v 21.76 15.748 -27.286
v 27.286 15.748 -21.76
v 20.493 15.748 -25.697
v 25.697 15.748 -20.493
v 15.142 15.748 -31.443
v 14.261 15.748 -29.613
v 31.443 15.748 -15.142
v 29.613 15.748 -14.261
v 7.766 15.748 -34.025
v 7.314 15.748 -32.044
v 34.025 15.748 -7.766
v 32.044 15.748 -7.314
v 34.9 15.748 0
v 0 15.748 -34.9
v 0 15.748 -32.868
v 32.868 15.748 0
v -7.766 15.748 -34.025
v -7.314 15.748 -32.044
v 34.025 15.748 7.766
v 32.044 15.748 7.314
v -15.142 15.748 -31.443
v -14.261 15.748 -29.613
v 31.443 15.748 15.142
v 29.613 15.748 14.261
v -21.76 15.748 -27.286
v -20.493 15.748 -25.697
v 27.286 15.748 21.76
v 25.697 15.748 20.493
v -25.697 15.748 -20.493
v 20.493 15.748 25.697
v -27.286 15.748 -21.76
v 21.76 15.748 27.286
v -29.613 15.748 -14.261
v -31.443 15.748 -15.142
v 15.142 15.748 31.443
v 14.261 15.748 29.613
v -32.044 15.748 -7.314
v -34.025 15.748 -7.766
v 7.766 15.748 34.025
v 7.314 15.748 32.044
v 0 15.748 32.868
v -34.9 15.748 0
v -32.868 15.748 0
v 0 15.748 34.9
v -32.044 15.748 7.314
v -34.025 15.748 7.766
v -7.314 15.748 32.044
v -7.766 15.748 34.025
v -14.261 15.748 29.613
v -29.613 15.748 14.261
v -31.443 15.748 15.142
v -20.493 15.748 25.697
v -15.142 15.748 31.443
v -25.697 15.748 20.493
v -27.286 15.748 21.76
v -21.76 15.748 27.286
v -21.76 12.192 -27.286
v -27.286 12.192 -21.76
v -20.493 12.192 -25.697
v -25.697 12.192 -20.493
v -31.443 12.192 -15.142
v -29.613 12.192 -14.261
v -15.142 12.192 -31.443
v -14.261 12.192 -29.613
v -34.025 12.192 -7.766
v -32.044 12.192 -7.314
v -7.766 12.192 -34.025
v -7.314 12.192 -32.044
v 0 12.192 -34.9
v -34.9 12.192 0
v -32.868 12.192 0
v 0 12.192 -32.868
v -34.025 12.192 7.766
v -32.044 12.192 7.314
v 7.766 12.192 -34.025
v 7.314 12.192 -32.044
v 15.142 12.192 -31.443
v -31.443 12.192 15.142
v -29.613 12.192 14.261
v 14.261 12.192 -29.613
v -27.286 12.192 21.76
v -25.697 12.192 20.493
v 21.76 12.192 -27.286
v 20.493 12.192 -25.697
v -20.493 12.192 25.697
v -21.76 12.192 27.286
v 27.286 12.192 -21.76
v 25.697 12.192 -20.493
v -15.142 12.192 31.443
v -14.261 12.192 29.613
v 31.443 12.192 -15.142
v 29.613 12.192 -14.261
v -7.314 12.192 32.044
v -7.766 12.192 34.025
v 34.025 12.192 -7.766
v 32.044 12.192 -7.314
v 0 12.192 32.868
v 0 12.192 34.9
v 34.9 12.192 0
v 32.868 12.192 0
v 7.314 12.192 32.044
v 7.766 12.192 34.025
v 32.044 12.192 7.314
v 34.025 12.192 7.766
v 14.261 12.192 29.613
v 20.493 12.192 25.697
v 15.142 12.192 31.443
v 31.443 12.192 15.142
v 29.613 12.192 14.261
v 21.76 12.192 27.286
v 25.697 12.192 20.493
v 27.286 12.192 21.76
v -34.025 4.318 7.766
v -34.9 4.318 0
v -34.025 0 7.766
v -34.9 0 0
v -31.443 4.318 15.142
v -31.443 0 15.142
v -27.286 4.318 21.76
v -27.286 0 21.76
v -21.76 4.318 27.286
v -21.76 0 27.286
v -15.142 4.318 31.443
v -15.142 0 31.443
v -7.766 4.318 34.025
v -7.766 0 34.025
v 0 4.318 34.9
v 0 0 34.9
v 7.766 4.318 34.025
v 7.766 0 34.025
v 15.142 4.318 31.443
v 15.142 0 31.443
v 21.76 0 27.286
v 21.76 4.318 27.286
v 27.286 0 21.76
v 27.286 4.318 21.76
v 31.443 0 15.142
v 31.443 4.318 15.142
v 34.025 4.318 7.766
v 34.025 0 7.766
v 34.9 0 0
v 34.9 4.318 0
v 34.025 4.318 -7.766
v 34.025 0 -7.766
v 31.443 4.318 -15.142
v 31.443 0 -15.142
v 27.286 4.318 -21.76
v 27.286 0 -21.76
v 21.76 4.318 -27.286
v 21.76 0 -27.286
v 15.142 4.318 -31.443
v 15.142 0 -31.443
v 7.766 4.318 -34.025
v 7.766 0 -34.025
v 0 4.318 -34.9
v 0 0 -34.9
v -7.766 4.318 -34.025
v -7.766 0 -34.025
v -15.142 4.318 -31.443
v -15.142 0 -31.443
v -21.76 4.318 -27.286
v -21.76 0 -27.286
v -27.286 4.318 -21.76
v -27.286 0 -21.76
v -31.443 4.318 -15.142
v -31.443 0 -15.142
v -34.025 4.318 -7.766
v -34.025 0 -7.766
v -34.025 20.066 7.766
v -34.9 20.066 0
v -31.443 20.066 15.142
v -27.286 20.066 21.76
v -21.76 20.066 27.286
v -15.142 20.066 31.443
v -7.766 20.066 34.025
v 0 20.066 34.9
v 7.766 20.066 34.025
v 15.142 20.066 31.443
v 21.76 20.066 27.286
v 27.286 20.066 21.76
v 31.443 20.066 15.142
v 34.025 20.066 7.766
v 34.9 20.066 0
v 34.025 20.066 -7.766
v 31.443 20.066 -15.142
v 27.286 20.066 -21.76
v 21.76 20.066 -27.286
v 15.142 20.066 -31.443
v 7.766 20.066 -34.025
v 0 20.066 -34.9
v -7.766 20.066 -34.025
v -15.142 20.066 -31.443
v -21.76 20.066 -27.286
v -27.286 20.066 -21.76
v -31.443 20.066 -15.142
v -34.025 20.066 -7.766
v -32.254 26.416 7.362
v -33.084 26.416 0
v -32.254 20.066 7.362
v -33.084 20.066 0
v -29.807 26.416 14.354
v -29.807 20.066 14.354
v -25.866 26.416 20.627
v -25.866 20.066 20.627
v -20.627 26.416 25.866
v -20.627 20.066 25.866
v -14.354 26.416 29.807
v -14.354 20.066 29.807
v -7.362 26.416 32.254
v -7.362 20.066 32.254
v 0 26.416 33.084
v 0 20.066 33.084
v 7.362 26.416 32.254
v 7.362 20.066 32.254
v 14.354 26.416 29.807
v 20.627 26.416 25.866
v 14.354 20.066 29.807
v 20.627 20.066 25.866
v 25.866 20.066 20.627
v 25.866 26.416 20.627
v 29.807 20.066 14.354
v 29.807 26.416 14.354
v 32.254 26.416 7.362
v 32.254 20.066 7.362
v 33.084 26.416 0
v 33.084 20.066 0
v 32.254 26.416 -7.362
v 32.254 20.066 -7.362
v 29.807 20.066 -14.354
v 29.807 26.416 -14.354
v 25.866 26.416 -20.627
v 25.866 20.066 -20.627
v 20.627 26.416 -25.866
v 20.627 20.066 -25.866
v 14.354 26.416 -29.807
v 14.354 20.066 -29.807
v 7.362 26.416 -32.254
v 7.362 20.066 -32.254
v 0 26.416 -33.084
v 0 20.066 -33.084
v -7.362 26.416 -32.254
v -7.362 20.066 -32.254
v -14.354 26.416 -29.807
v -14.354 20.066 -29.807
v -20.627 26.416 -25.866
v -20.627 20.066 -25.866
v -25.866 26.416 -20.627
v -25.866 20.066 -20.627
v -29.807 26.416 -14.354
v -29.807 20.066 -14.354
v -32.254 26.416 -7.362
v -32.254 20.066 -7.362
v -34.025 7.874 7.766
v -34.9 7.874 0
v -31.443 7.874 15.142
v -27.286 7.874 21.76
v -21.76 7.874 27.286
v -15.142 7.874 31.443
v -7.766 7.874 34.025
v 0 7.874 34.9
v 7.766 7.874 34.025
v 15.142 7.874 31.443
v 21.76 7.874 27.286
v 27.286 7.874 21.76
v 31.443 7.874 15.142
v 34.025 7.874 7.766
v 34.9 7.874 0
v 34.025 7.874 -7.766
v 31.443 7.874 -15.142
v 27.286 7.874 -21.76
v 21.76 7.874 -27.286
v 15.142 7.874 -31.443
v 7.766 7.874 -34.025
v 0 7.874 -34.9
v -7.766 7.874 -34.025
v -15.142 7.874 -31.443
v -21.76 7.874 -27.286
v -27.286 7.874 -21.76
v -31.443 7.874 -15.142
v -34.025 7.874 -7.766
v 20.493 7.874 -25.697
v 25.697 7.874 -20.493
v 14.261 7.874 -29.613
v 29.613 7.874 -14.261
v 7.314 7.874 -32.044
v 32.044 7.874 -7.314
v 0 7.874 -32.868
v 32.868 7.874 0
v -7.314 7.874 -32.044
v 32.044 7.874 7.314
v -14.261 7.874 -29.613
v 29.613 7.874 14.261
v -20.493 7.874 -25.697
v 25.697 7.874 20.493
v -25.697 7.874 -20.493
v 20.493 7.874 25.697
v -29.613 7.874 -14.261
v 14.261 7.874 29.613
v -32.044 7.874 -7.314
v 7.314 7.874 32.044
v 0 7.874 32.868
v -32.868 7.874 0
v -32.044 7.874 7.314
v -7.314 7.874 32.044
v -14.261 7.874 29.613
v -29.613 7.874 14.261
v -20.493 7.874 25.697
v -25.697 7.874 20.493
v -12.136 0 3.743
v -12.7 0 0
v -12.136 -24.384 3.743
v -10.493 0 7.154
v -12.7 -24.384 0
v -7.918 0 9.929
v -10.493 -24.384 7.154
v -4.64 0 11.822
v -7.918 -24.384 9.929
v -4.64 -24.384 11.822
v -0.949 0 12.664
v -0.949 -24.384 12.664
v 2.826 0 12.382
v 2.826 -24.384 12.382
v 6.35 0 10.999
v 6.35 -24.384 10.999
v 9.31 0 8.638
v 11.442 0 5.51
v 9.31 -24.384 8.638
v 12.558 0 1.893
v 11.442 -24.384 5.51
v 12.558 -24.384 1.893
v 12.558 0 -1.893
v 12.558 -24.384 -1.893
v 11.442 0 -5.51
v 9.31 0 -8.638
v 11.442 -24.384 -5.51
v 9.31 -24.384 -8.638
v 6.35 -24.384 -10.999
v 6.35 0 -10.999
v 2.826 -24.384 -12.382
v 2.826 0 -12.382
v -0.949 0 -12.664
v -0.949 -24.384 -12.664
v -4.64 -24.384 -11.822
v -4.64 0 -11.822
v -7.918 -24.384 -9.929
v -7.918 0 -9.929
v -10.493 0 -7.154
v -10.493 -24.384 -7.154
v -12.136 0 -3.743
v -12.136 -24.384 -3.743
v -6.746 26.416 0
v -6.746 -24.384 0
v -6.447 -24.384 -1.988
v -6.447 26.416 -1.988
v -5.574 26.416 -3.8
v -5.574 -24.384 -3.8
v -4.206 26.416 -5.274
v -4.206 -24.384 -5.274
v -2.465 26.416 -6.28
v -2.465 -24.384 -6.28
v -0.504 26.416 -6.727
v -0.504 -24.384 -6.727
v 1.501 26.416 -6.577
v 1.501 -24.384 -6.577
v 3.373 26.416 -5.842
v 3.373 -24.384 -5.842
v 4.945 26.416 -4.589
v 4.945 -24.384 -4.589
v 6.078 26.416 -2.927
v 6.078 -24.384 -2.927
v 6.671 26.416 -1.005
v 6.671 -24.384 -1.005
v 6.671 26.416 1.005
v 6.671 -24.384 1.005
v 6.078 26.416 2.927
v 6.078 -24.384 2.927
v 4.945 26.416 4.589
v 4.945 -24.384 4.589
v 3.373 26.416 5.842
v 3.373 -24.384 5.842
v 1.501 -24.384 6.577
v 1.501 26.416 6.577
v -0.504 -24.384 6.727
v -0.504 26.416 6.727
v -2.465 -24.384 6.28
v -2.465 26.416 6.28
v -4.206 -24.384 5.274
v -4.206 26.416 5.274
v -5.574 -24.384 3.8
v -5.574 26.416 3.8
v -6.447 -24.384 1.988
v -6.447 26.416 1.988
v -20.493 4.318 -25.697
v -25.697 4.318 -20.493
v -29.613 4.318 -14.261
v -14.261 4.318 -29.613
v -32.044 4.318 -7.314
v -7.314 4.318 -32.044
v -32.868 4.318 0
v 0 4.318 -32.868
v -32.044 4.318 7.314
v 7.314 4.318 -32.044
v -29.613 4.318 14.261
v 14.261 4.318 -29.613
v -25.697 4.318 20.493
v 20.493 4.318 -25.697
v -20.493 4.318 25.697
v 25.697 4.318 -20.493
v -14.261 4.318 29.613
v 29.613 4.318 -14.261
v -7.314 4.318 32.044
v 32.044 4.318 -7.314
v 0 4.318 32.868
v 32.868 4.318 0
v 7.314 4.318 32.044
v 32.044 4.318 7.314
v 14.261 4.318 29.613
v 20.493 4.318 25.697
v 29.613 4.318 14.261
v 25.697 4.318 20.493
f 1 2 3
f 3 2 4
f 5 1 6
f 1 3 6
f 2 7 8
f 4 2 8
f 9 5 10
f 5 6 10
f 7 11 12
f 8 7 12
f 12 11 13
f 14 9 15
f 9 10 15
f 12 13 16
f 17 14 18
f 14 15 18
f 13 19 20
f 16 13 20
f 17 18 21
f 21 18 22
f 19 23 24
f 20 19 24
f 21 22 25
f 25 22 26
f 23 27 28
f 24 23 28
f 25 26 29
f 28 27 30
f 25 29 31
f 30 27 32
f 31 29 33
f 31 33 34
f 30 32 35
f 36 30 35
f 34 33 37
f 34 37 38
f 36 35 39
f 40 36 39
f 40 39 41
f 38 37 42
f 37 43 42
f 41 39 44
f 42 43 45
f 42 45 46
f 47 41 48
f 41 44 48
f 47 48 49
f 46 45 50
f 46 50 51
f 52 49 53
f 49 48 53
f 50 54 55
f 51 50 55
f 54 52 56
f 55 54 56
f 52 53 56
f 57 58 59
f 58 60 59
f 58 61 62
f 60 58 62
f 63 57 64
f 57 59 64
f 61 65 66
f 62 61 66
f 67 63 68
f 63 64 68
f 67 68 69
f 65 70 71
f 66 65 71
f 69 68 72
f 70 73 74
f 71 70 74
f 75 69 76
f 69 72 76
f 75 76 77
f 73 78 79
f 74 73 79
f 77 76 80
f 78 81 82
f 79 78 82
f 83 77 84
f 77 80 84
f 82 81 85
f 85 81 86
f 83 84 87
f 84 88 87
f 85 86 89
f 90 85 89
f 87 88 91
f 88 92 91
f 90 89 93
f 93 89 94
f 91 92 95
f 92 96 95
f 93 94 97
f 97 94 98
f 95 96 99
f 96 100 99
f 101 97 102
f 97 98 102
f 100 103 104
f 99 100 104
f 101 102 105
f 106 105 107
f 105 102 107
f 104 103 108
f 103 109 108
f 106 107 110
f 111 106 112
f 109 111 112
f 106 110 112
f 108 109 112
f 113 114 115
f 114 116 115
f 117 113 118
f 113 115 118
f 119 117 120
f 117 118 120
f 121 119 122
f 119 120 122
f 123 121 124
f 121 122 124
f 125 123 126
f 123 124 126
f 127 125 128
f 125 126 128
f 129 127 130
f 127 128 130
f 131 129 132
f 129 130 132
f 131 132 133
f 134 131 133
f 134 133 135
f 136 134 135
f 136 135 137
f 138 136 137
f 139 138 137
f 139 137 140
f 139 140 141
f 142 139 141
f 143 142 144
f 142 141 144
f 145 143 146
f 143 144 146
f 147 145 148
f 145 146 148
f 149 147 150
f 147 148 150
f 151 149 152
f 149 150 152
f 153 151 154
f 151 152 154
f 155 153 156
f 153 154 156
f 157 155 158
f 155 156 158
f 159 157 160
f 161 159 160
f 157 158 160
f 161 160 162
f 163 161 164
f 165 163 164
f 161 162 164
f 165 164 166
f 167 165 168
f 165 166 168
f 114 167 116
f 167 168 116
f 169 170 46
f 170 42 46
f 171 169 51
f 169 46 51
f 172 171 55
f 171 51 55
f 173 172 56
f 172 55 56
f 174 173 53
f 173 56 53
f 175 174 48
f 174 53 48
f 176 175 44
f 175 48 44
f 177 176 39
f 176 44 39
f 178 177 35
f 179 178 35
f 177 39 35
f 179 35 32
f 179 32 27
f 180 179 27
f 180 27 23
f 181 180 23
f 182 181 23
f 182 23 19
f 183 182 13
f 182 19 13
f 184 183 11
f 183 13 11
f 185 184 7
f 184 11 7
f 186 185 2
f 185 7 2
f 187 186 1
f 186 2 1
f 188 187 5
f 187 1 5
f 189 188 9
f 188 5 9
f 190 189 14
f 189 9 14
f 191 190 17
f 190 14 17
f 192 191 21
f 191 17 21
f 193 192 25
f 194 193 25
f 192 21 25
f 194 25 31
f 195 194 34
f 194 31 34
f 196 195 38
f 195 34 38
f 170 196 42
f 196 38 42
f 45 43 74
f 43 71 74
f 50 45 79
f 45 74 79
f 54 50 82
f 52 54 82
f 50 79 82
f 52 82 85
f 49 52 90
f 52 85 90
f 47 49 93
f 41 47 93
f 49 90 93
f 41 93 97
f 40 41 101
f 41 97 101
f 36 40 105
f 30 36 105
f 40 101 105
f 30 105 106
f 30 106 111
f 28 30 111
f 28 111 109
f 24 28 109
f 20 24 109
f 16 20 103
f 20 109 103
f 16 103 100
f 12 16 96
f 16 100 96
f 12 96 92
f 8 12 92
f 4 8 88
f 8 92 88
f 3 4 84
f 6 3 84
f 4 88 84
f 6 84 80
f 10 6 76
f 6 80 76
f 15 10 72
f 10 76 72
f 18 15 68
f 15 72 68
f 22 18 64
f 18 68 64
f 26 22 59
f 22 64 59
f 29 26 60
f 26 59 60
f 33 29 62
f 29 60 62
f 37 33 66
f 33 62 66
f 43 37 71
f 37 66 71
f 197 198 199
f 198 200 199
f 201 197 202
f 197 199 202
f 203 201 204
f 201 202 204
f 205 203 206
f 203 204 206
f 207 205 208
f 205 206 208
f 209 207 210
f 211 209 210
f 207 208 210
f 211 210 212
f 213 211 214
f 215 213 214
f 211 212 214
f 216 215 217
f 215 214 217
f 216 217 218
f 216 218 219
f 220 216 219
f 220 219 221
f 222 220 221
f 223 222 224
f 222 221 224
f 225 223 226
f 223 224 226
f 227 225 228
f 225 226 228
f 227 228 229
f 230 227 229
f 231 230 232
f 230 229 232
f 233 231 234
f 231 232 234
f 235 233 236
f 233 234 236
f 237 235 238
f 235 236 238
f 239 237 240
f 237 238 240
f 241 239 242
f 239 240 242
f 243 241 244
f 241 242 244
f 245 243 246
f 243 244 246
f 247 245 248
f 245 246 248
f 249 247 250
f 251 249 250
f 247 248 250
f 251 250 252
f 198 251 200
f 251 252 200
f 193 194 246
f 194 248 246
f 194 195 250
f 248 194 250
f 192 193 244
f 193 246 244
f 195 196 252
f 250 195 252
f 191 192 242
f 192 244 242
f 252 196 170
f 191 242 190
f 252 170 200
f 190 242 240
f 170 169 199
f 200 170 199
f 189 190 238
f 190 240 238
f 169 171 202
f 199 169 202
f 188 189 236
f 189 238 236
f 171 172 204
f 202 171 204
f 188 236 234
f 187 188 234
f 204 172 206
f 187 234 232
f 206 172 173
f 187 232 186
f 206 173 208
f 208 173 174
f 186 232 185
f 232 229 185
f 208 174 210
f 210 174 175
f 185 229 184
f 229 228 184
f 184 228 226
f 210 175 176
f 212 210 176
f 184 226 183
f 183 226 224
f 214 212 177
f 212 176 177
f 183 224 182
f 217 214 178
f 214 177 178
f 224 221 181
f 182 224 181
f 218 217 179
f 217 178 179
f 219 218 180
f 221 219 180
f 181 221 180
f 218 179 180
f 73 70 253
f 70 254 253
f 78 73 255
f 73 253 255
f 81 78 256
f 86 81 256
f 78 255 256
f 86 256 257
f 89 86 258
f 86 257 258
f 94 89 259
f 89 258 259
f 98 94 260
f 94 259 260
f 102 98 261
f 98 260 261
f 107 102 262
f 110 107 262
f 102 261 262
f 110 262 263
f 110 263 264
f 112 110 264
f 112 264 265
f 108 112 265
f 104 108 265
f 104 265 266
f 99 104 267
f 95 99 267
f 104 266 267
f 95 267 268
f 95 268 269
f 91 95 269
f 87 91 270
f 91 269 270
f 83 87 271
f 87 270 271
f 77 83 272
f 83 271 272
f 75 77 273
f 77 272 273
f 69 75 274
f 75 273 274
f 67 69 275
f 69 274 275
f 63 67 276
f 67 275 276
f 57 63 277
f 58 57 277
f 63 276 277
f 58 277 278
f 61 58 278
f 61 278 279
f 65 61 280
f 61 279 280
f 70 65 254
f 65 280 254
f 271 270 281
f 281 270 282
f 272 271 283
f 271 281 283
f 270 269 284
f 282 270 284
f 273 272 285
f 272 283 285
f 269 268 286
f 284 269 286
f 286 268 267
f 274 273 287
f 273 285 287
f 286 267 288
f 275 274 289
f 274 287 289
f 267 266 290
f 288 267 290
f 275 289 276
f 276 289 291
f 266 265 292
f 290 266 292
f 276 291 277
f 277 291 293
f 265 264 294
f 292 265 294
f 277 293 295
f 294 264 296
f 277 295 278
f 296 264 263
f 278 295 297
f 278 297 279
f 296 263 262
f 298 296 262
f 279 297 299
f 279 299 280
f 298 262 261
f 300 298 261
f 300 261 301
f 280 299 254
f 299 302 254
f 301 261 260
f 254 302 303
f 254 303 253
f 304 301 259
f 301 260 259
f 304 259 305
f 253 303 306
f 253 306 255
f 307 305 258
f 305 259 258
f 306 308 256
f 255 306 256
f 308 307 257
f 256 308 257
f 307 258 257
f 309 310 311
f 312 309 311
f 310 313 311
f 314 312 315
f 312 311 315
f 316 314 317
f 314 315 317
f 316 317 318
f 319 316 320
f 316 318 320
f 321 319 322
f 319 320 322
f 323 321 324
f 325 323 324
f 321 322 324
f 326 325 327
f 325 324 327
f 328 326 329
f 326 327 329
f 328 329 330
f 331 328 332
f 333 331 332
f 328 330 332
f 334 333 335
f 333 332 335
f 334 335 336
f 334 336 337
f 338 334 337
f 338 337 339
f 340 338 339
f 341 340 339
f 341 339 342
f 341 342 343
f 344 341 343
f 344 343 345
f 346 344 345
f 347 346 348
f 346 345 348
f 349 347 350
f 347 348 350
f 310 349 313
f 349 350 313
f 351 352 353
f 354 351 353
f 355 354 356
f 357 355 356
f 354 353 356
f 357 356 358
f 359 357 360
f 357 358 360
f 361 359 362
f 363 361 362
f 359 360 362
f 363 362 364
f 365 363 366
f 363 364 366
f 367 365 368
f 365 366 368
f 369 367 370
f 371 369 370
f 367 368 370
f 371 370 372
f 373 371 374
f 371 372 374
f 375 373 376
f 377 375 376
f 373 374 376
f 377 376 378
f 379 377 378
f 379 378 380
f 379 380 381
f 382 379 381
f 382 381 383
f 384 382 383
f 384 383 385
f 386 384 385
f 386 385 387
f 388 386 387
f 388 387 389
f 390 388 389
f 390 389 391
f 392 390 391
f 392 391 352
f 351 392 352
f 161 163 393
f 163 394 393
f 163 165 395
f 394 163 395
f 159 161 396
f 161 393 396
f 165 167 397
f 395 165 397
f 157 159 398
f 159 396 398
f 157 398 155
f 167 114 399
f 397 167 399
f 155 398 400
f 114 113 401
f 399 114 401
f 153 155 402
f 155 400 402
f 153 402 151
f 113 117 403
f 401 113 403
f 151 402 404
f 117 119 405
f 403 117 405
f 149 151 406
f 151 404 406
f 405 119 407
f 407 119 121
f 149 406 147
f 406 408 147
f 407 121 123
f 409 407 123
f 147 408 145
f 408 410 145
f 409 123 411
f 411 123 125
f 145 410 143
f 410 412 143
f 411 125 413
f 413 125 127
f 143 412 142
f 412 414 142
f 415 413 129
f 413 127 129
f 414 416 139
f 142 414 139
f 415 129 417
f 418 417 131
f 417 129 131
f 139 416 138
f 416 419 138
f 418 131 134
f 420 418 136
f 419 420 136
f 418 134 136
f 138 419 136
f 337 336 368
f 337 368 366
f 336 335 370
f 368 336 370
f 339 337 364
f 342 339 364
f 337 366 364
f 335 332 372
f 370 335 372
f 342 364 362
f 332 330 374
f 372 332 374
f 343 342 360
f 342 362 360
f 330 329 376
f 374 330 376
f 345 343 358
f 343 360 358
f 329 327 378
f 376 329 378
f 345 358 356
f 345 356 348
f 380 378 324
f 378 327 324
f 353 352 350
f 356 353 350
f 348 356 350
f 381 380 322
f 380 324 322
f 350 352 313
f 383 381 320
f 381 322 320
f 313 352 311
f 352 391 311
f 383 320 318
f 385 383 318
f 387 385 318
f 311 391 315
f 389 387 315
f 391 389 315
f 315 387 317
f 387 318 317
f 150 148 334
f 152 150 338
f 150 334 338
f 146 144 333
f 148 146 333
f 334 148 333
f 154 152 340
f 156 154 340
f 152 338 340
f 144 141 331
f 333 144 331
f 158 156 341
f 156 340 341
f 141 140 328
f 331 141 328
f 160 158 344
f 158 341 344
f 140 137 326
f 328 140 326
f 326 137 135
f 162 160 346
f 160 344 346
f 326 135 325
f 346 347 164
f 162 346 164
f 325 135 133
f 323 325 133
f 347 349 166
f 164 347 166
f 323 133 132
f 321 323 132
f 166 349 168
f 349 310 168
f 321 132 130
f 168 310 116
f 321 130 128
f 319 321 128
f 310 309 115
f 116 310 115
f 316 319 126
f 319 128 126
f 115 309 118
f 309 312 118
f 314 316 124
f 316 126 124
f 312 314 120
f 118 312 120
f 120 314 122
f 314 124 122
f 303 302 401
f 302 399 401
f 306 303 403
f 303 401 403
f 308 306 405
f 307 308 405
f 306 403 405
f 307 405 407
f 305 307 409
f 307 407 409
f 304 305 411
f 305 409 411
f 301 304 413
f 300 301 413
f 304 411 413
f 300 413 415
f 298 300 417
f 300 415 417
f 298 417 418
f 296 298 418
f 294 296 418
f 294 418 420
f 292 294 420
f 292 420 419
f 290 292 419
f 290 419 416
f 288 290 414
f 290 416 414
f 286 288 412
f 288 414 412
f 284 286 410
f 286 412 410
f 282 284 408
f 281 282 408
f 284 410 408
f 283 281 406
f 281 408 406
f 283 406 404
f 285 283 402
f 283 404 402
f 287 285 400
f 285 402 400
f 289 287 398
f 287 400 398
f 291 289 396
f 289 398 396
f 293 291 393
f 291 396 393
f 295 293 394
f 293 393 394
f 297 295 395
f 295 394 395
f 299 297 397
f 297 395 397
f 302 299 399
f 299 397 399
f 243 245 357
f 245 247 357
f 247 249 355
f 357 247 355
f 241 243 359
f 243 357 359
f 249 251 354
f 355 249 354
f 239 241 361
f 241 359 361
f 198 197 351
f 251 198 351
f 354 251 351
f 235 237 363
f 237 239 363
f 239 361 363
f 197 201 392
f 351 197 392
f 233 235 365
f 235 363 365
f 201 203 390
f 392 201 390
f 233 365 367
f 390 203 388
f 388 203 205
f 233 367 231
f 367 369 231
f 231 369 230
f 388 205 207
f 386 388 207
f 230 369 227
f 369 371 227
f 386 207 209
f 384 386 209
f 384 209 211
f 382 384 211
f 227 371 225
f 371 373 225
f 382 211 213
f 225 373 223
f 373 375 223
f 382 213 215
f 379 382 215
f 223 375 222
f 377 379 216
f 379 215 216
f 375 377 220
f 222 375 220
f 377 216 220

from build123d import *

# Parameters (mm, degrees)
F_5_8_11_TAPPED_HOLE1_D = 13.49248


with BuildPart() as part:
    # Sketch8 → Revolve1 (revolve)
    with BuildSketch(Plane.XY):
        Polygon((0, 0), (0, 26.416), (-33.0835, 26.416), (-33.0835, 20.066), (-34.8996, 20.066), (-34.8996, 15.748), (-32.8676, 15.748), (-32.8676, 12.192), (-34.8996, 12.192), (-34.8996, 7.874), (-32.8676, 7.874), (-32.8676, 4.318), (-34.8996, 4.318), (-34.8996, 0), (-12.7, 0), (-12.7, -24.384), (0, -24.384), align=None)
    revolve(axis=Axis((0, 0, 0), (0, 1, 0)))

    # 5/8-11 Tapped Hole1 (through all)
    with Locations(Plane(origin=(0, 26.416, 0), x_dir=(1, 0, 0), z_dir=(0, 1, 0))):
        with Locations((0, 0)):
            Hole(F_5_8_11_TAPPED_HOLE1_D / 2)


solid = part.part
